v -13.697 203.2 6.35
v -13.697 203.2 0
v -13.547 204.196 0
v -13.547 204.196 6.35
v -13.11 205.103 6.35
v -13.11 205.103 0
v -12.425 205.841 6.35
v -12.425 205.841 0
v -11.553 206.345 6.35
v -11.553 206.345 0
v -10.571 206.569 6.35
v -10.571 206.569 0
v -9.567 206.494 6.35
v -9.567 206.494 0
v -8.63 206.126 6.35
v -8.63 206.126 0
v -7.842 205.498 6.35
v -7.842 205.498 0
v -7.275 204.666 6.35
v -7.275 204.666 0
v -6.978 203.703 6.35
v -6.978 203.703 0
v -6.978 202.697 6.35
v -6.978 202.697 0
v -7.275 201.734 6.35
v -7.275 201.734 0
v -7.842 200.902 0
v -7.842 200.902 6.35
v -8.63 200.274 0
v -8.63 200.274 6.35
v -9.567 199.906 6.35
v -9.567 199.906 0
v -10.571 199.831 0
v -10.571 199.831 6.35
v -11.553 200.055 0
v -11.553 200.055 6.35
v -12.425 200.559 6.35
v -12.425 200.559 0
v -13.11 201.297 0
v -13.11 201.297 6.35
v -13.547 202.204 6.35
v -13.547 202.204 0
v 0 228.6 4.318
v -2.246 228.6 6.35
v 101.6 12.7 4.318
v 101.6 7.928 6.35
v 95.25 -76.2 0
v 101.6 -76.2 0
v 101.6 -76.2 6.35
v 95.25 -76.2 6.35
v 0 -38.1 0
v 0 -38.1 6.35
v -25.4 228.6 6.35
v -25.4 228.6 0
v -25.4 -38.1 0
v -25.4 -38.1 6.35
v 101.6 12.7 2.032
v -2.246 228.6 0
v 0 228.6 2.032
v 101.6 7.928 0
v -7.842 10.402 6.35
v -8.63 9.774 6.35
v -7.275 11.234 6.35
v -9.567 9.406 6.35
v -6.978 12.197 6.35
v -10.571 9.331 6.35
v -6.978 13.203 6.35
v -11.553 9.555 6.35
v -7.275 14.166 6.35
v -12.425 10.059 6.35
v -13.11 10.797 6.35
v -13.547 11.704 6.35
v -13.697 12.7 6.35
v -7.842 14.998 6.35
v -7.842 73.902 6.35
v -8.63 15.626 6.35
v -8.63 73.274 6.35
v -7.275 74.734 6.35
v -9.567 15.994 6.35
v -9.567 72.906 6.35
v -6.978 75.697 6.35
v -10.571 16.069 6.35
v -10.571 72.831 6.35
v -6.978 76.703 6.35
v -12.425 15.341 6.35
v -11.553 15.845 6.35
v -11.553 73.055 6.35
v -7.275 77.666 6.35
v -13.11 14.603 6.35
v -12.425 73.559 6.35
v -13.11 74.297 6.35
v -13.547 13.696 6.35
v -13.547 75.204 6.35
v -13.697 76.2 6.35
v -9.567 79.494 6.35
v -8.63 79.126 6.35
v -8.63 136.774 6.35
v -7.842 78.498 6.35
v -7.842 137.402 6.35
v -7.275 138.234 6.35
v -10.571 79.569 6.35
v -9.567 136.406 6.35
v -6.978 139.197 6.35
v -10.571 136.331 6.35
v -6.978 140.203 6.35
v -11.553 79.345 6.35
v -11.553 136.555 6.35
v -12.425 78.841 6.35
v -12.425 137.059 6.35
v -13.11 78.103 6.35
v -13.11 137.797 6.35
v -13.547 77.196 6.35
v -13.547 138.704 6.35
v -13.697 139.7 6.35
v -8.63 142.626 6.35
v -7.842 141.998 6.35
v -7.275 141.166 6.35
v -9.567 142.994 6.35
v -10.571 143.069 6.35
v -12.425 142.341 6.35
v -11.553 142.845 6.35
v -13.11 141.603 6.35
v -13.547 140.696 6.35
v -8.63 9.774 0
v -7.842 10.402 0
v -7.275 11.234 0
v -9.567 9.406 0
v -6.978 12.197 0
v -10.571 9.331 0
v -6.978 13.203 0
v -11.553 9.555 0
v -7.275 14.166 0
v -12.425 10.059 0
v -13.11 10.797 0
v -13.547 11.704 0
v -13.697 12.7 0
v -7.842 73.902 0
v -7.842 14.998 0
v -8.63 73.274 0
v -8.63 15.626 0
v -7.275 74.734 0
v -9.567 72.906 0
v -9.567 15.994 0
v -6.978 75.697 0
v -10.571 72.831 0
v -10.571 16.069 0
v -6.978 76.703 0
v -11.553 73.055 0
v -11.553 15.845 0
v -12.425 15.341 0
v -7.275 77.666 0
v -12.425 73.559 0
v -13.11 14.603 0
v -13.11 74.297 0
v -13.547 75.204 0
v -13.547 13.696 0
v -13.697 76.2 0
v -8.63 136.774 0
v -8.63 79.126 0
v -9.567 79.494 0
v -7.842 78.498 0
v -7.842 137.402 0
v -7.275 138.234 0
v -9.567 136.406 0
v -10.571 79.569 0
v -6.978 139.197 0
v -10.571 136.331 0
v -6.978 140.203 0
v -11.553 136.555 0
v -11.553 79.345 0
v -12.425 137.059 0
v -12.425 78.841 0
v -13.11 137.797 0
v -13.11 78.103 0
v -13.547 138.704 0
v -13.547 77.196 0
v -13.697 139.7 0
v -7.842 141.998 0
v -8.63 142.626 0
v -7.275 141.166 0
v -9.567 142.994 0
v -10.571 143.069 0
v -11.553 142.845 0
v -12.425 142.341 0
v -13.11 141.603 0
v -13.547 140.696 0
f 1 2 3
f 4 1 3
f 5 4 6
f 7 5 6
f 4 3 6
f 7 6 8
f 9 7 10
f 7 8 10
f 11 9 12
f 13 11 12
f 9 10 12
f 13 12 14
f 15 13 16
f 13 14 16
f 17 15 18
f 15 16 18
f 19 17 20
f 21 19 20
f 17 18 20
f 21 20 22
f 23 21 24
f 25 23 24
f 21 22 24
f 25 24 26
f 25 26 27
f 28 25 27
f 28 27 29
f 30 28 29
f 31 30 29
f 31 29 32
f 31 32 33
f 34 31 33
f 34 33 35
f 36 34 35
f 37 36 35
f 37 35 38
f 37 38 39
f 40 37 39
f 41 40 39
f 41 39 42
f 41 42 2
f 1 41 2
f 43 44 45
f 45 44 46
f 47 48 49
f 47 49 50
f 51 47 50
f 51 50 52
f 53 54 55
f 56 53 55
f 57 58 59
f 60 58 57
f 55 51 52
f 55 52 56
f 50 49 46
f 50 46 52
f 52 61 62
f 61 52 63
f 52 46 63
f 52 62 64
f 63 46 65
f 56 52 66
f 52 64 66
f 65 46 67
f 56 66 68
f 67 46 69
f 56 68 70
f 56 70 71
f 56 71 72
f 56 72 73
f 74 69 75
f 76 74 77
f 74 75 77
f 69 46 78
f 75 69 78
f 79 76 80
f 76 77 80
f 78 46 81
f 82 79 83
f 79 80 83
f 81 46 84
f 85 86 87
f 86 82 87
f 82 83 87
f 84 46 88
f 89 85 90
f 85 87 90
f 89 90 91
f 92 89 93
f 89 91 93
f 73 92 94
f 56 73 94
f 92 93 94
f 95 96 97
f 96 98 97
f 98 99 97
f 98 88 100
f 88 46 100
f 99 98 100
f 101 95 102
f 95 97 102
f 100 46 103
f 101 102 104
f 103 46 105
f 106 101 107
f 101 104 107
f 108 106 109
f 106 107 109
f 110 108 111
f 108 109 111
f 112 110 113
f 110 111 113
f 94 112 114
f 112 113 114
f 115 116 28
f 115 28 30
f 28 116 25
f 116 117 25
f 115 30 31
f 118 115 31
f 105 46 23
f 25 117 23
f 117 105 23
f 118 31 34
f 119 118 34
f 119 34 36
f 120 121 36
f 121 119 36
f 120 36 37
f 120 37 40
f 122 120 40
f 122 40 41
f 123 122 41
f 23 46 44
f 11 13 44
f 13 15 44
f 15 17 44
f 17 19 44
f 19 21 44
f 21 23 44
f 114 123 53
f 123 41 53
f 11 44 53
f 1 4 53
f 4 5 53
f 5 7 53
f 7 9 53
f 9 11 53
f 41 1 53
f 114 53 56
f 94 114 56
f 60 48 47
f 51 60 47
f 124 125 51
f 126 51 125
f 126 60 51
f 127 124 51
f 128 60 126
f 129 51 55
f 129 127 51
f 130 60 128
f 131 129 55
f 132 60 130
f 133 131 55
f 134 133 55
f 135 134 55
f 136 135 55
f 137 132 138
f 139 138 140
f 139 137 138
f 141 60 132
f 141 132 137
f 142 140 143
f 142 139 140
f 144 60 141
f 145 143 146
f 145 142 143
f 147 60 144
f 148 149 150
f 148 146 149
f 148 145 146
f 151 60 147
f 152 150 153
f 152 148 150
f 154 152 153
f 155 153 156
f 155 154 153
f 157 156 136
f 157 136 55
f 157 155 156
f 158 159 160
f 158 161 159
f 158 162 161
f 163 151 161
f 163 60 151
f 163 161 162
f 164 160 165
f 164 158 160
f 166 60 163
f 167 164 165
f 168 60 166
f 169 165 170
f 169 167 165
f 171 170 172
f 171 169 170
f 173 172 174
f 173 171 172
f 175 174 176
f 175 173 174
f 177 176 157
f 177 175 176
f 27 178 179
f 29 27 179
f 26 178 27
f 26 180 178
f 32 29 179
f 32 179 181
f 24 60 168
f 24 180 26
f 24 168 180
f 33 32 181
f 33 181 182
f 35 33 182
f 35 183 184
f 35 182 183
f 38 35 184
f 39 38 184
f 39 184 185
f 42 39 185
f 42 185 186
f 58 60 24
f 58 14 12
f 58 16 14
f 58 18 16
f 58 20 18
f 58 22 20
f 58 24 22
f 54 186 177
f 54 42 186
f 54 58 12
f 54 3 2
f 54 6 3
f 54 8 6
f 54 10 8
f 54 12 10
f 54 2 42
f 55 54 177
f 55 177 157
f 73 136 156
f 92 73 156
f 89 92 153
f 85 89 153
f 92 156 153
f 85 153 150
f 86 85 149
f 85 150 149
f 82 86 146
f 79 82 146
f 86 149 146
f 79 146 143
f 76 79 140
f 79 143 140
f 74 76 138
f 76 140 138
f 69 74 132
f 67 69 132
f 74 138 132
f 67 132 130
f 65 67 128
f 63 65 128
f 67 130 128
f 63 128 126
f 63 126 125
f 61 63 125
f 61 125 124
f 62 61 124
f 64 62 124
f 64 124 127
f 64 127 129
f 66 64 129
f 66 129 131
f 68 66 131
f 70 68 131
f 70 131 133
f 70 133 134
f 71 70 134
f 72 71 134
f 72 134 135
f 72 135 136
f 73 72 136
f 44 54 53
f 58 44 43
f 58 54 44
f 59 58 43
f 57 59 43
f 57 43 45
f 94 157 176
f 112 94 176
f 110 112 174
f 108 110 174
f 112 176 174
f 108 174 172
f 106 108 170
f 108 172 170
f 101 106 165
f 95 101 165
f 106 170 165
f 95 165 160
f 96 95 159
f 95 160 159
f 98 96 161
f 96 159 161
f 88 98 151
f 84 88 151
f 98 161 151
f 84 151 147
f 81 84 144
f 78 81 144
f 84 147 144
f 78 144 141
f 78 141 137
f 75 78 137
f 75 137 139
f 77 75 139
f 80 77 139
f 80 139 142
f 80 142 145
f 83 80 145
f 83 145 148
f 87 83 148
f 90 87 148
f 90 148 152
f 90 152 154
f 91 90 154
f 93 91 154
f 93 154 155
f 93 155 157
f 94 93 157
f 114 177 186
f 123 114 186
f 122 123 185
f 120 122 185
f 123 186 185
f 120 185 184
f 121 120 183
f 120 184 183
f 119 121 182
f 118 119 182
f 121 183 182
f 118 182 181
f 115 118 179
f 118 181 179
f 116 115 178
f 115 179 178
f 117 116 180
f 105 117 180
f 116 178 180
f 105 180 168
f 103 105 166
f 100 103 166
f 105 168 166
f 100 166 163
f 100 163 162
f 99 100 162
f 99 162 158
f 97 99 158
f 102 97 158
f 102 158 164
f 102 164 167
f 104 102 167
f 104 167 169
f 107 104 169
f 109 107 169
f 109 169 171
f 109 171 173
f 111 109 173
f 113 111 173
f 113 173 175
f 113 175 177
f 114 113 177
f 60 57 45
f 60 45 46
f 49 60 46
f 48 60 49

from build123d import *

# Parameters (mm, degrees)
BOSS_EXTRUDE1_DEPTH     = 6.35
CHAMFER1_SIZE           = 2.032
F_1_4_CLEARANCE_HOLE1_D = 6.7564
LPATTERN1_COUNT         = 4
LPATTERN1_PITCH         = 63.5


with BuildPart() as part:
    # Sketch1 → Boss-Extrude1 (new body)
    with BuildSketch(Plane.XY):
        Polygon((101.6, 12.7), (101.6, -76.2), (95.25, -76.2), (0, -38.1), (-25.4, -38.1), (-25.4, 0), (-25.4, 228.6), (0, 228.6), align=None)
    extrude(amount=BOSS_EXTRUDE1_DEPTH)

    # Chamfer1
    chamfer1_edges = [part.edges().sort_by_distance(p)[0] for p in [
        (50.8, 120.65, 0),
        (50.8, 120.65, 6.35),
    ]]
    chamfer(chamfer1_edges, length=CHAMFER1_SIZE)

    # 1/4 Clearance Hole1 (through all)
    with Locations(Plane.XY.offset(6.35)):
        with Locations((-10.31875, 203.2)):
            f_1_4_clearance_hole1 = Hole(F_1_4_CLEARANCE_HOLE1_D / 2)

    # LPattern1: 1/4 Clearance Hole1 ×4
    with Locations(*[(0, -i * LPATTERN1_PITCH, 0) for i in range(1, LPATTERN1_COUNT)]):
        add(f_1_4_clearance_hole1, mode=Mode.SUBTRACT)


solid = part.part
